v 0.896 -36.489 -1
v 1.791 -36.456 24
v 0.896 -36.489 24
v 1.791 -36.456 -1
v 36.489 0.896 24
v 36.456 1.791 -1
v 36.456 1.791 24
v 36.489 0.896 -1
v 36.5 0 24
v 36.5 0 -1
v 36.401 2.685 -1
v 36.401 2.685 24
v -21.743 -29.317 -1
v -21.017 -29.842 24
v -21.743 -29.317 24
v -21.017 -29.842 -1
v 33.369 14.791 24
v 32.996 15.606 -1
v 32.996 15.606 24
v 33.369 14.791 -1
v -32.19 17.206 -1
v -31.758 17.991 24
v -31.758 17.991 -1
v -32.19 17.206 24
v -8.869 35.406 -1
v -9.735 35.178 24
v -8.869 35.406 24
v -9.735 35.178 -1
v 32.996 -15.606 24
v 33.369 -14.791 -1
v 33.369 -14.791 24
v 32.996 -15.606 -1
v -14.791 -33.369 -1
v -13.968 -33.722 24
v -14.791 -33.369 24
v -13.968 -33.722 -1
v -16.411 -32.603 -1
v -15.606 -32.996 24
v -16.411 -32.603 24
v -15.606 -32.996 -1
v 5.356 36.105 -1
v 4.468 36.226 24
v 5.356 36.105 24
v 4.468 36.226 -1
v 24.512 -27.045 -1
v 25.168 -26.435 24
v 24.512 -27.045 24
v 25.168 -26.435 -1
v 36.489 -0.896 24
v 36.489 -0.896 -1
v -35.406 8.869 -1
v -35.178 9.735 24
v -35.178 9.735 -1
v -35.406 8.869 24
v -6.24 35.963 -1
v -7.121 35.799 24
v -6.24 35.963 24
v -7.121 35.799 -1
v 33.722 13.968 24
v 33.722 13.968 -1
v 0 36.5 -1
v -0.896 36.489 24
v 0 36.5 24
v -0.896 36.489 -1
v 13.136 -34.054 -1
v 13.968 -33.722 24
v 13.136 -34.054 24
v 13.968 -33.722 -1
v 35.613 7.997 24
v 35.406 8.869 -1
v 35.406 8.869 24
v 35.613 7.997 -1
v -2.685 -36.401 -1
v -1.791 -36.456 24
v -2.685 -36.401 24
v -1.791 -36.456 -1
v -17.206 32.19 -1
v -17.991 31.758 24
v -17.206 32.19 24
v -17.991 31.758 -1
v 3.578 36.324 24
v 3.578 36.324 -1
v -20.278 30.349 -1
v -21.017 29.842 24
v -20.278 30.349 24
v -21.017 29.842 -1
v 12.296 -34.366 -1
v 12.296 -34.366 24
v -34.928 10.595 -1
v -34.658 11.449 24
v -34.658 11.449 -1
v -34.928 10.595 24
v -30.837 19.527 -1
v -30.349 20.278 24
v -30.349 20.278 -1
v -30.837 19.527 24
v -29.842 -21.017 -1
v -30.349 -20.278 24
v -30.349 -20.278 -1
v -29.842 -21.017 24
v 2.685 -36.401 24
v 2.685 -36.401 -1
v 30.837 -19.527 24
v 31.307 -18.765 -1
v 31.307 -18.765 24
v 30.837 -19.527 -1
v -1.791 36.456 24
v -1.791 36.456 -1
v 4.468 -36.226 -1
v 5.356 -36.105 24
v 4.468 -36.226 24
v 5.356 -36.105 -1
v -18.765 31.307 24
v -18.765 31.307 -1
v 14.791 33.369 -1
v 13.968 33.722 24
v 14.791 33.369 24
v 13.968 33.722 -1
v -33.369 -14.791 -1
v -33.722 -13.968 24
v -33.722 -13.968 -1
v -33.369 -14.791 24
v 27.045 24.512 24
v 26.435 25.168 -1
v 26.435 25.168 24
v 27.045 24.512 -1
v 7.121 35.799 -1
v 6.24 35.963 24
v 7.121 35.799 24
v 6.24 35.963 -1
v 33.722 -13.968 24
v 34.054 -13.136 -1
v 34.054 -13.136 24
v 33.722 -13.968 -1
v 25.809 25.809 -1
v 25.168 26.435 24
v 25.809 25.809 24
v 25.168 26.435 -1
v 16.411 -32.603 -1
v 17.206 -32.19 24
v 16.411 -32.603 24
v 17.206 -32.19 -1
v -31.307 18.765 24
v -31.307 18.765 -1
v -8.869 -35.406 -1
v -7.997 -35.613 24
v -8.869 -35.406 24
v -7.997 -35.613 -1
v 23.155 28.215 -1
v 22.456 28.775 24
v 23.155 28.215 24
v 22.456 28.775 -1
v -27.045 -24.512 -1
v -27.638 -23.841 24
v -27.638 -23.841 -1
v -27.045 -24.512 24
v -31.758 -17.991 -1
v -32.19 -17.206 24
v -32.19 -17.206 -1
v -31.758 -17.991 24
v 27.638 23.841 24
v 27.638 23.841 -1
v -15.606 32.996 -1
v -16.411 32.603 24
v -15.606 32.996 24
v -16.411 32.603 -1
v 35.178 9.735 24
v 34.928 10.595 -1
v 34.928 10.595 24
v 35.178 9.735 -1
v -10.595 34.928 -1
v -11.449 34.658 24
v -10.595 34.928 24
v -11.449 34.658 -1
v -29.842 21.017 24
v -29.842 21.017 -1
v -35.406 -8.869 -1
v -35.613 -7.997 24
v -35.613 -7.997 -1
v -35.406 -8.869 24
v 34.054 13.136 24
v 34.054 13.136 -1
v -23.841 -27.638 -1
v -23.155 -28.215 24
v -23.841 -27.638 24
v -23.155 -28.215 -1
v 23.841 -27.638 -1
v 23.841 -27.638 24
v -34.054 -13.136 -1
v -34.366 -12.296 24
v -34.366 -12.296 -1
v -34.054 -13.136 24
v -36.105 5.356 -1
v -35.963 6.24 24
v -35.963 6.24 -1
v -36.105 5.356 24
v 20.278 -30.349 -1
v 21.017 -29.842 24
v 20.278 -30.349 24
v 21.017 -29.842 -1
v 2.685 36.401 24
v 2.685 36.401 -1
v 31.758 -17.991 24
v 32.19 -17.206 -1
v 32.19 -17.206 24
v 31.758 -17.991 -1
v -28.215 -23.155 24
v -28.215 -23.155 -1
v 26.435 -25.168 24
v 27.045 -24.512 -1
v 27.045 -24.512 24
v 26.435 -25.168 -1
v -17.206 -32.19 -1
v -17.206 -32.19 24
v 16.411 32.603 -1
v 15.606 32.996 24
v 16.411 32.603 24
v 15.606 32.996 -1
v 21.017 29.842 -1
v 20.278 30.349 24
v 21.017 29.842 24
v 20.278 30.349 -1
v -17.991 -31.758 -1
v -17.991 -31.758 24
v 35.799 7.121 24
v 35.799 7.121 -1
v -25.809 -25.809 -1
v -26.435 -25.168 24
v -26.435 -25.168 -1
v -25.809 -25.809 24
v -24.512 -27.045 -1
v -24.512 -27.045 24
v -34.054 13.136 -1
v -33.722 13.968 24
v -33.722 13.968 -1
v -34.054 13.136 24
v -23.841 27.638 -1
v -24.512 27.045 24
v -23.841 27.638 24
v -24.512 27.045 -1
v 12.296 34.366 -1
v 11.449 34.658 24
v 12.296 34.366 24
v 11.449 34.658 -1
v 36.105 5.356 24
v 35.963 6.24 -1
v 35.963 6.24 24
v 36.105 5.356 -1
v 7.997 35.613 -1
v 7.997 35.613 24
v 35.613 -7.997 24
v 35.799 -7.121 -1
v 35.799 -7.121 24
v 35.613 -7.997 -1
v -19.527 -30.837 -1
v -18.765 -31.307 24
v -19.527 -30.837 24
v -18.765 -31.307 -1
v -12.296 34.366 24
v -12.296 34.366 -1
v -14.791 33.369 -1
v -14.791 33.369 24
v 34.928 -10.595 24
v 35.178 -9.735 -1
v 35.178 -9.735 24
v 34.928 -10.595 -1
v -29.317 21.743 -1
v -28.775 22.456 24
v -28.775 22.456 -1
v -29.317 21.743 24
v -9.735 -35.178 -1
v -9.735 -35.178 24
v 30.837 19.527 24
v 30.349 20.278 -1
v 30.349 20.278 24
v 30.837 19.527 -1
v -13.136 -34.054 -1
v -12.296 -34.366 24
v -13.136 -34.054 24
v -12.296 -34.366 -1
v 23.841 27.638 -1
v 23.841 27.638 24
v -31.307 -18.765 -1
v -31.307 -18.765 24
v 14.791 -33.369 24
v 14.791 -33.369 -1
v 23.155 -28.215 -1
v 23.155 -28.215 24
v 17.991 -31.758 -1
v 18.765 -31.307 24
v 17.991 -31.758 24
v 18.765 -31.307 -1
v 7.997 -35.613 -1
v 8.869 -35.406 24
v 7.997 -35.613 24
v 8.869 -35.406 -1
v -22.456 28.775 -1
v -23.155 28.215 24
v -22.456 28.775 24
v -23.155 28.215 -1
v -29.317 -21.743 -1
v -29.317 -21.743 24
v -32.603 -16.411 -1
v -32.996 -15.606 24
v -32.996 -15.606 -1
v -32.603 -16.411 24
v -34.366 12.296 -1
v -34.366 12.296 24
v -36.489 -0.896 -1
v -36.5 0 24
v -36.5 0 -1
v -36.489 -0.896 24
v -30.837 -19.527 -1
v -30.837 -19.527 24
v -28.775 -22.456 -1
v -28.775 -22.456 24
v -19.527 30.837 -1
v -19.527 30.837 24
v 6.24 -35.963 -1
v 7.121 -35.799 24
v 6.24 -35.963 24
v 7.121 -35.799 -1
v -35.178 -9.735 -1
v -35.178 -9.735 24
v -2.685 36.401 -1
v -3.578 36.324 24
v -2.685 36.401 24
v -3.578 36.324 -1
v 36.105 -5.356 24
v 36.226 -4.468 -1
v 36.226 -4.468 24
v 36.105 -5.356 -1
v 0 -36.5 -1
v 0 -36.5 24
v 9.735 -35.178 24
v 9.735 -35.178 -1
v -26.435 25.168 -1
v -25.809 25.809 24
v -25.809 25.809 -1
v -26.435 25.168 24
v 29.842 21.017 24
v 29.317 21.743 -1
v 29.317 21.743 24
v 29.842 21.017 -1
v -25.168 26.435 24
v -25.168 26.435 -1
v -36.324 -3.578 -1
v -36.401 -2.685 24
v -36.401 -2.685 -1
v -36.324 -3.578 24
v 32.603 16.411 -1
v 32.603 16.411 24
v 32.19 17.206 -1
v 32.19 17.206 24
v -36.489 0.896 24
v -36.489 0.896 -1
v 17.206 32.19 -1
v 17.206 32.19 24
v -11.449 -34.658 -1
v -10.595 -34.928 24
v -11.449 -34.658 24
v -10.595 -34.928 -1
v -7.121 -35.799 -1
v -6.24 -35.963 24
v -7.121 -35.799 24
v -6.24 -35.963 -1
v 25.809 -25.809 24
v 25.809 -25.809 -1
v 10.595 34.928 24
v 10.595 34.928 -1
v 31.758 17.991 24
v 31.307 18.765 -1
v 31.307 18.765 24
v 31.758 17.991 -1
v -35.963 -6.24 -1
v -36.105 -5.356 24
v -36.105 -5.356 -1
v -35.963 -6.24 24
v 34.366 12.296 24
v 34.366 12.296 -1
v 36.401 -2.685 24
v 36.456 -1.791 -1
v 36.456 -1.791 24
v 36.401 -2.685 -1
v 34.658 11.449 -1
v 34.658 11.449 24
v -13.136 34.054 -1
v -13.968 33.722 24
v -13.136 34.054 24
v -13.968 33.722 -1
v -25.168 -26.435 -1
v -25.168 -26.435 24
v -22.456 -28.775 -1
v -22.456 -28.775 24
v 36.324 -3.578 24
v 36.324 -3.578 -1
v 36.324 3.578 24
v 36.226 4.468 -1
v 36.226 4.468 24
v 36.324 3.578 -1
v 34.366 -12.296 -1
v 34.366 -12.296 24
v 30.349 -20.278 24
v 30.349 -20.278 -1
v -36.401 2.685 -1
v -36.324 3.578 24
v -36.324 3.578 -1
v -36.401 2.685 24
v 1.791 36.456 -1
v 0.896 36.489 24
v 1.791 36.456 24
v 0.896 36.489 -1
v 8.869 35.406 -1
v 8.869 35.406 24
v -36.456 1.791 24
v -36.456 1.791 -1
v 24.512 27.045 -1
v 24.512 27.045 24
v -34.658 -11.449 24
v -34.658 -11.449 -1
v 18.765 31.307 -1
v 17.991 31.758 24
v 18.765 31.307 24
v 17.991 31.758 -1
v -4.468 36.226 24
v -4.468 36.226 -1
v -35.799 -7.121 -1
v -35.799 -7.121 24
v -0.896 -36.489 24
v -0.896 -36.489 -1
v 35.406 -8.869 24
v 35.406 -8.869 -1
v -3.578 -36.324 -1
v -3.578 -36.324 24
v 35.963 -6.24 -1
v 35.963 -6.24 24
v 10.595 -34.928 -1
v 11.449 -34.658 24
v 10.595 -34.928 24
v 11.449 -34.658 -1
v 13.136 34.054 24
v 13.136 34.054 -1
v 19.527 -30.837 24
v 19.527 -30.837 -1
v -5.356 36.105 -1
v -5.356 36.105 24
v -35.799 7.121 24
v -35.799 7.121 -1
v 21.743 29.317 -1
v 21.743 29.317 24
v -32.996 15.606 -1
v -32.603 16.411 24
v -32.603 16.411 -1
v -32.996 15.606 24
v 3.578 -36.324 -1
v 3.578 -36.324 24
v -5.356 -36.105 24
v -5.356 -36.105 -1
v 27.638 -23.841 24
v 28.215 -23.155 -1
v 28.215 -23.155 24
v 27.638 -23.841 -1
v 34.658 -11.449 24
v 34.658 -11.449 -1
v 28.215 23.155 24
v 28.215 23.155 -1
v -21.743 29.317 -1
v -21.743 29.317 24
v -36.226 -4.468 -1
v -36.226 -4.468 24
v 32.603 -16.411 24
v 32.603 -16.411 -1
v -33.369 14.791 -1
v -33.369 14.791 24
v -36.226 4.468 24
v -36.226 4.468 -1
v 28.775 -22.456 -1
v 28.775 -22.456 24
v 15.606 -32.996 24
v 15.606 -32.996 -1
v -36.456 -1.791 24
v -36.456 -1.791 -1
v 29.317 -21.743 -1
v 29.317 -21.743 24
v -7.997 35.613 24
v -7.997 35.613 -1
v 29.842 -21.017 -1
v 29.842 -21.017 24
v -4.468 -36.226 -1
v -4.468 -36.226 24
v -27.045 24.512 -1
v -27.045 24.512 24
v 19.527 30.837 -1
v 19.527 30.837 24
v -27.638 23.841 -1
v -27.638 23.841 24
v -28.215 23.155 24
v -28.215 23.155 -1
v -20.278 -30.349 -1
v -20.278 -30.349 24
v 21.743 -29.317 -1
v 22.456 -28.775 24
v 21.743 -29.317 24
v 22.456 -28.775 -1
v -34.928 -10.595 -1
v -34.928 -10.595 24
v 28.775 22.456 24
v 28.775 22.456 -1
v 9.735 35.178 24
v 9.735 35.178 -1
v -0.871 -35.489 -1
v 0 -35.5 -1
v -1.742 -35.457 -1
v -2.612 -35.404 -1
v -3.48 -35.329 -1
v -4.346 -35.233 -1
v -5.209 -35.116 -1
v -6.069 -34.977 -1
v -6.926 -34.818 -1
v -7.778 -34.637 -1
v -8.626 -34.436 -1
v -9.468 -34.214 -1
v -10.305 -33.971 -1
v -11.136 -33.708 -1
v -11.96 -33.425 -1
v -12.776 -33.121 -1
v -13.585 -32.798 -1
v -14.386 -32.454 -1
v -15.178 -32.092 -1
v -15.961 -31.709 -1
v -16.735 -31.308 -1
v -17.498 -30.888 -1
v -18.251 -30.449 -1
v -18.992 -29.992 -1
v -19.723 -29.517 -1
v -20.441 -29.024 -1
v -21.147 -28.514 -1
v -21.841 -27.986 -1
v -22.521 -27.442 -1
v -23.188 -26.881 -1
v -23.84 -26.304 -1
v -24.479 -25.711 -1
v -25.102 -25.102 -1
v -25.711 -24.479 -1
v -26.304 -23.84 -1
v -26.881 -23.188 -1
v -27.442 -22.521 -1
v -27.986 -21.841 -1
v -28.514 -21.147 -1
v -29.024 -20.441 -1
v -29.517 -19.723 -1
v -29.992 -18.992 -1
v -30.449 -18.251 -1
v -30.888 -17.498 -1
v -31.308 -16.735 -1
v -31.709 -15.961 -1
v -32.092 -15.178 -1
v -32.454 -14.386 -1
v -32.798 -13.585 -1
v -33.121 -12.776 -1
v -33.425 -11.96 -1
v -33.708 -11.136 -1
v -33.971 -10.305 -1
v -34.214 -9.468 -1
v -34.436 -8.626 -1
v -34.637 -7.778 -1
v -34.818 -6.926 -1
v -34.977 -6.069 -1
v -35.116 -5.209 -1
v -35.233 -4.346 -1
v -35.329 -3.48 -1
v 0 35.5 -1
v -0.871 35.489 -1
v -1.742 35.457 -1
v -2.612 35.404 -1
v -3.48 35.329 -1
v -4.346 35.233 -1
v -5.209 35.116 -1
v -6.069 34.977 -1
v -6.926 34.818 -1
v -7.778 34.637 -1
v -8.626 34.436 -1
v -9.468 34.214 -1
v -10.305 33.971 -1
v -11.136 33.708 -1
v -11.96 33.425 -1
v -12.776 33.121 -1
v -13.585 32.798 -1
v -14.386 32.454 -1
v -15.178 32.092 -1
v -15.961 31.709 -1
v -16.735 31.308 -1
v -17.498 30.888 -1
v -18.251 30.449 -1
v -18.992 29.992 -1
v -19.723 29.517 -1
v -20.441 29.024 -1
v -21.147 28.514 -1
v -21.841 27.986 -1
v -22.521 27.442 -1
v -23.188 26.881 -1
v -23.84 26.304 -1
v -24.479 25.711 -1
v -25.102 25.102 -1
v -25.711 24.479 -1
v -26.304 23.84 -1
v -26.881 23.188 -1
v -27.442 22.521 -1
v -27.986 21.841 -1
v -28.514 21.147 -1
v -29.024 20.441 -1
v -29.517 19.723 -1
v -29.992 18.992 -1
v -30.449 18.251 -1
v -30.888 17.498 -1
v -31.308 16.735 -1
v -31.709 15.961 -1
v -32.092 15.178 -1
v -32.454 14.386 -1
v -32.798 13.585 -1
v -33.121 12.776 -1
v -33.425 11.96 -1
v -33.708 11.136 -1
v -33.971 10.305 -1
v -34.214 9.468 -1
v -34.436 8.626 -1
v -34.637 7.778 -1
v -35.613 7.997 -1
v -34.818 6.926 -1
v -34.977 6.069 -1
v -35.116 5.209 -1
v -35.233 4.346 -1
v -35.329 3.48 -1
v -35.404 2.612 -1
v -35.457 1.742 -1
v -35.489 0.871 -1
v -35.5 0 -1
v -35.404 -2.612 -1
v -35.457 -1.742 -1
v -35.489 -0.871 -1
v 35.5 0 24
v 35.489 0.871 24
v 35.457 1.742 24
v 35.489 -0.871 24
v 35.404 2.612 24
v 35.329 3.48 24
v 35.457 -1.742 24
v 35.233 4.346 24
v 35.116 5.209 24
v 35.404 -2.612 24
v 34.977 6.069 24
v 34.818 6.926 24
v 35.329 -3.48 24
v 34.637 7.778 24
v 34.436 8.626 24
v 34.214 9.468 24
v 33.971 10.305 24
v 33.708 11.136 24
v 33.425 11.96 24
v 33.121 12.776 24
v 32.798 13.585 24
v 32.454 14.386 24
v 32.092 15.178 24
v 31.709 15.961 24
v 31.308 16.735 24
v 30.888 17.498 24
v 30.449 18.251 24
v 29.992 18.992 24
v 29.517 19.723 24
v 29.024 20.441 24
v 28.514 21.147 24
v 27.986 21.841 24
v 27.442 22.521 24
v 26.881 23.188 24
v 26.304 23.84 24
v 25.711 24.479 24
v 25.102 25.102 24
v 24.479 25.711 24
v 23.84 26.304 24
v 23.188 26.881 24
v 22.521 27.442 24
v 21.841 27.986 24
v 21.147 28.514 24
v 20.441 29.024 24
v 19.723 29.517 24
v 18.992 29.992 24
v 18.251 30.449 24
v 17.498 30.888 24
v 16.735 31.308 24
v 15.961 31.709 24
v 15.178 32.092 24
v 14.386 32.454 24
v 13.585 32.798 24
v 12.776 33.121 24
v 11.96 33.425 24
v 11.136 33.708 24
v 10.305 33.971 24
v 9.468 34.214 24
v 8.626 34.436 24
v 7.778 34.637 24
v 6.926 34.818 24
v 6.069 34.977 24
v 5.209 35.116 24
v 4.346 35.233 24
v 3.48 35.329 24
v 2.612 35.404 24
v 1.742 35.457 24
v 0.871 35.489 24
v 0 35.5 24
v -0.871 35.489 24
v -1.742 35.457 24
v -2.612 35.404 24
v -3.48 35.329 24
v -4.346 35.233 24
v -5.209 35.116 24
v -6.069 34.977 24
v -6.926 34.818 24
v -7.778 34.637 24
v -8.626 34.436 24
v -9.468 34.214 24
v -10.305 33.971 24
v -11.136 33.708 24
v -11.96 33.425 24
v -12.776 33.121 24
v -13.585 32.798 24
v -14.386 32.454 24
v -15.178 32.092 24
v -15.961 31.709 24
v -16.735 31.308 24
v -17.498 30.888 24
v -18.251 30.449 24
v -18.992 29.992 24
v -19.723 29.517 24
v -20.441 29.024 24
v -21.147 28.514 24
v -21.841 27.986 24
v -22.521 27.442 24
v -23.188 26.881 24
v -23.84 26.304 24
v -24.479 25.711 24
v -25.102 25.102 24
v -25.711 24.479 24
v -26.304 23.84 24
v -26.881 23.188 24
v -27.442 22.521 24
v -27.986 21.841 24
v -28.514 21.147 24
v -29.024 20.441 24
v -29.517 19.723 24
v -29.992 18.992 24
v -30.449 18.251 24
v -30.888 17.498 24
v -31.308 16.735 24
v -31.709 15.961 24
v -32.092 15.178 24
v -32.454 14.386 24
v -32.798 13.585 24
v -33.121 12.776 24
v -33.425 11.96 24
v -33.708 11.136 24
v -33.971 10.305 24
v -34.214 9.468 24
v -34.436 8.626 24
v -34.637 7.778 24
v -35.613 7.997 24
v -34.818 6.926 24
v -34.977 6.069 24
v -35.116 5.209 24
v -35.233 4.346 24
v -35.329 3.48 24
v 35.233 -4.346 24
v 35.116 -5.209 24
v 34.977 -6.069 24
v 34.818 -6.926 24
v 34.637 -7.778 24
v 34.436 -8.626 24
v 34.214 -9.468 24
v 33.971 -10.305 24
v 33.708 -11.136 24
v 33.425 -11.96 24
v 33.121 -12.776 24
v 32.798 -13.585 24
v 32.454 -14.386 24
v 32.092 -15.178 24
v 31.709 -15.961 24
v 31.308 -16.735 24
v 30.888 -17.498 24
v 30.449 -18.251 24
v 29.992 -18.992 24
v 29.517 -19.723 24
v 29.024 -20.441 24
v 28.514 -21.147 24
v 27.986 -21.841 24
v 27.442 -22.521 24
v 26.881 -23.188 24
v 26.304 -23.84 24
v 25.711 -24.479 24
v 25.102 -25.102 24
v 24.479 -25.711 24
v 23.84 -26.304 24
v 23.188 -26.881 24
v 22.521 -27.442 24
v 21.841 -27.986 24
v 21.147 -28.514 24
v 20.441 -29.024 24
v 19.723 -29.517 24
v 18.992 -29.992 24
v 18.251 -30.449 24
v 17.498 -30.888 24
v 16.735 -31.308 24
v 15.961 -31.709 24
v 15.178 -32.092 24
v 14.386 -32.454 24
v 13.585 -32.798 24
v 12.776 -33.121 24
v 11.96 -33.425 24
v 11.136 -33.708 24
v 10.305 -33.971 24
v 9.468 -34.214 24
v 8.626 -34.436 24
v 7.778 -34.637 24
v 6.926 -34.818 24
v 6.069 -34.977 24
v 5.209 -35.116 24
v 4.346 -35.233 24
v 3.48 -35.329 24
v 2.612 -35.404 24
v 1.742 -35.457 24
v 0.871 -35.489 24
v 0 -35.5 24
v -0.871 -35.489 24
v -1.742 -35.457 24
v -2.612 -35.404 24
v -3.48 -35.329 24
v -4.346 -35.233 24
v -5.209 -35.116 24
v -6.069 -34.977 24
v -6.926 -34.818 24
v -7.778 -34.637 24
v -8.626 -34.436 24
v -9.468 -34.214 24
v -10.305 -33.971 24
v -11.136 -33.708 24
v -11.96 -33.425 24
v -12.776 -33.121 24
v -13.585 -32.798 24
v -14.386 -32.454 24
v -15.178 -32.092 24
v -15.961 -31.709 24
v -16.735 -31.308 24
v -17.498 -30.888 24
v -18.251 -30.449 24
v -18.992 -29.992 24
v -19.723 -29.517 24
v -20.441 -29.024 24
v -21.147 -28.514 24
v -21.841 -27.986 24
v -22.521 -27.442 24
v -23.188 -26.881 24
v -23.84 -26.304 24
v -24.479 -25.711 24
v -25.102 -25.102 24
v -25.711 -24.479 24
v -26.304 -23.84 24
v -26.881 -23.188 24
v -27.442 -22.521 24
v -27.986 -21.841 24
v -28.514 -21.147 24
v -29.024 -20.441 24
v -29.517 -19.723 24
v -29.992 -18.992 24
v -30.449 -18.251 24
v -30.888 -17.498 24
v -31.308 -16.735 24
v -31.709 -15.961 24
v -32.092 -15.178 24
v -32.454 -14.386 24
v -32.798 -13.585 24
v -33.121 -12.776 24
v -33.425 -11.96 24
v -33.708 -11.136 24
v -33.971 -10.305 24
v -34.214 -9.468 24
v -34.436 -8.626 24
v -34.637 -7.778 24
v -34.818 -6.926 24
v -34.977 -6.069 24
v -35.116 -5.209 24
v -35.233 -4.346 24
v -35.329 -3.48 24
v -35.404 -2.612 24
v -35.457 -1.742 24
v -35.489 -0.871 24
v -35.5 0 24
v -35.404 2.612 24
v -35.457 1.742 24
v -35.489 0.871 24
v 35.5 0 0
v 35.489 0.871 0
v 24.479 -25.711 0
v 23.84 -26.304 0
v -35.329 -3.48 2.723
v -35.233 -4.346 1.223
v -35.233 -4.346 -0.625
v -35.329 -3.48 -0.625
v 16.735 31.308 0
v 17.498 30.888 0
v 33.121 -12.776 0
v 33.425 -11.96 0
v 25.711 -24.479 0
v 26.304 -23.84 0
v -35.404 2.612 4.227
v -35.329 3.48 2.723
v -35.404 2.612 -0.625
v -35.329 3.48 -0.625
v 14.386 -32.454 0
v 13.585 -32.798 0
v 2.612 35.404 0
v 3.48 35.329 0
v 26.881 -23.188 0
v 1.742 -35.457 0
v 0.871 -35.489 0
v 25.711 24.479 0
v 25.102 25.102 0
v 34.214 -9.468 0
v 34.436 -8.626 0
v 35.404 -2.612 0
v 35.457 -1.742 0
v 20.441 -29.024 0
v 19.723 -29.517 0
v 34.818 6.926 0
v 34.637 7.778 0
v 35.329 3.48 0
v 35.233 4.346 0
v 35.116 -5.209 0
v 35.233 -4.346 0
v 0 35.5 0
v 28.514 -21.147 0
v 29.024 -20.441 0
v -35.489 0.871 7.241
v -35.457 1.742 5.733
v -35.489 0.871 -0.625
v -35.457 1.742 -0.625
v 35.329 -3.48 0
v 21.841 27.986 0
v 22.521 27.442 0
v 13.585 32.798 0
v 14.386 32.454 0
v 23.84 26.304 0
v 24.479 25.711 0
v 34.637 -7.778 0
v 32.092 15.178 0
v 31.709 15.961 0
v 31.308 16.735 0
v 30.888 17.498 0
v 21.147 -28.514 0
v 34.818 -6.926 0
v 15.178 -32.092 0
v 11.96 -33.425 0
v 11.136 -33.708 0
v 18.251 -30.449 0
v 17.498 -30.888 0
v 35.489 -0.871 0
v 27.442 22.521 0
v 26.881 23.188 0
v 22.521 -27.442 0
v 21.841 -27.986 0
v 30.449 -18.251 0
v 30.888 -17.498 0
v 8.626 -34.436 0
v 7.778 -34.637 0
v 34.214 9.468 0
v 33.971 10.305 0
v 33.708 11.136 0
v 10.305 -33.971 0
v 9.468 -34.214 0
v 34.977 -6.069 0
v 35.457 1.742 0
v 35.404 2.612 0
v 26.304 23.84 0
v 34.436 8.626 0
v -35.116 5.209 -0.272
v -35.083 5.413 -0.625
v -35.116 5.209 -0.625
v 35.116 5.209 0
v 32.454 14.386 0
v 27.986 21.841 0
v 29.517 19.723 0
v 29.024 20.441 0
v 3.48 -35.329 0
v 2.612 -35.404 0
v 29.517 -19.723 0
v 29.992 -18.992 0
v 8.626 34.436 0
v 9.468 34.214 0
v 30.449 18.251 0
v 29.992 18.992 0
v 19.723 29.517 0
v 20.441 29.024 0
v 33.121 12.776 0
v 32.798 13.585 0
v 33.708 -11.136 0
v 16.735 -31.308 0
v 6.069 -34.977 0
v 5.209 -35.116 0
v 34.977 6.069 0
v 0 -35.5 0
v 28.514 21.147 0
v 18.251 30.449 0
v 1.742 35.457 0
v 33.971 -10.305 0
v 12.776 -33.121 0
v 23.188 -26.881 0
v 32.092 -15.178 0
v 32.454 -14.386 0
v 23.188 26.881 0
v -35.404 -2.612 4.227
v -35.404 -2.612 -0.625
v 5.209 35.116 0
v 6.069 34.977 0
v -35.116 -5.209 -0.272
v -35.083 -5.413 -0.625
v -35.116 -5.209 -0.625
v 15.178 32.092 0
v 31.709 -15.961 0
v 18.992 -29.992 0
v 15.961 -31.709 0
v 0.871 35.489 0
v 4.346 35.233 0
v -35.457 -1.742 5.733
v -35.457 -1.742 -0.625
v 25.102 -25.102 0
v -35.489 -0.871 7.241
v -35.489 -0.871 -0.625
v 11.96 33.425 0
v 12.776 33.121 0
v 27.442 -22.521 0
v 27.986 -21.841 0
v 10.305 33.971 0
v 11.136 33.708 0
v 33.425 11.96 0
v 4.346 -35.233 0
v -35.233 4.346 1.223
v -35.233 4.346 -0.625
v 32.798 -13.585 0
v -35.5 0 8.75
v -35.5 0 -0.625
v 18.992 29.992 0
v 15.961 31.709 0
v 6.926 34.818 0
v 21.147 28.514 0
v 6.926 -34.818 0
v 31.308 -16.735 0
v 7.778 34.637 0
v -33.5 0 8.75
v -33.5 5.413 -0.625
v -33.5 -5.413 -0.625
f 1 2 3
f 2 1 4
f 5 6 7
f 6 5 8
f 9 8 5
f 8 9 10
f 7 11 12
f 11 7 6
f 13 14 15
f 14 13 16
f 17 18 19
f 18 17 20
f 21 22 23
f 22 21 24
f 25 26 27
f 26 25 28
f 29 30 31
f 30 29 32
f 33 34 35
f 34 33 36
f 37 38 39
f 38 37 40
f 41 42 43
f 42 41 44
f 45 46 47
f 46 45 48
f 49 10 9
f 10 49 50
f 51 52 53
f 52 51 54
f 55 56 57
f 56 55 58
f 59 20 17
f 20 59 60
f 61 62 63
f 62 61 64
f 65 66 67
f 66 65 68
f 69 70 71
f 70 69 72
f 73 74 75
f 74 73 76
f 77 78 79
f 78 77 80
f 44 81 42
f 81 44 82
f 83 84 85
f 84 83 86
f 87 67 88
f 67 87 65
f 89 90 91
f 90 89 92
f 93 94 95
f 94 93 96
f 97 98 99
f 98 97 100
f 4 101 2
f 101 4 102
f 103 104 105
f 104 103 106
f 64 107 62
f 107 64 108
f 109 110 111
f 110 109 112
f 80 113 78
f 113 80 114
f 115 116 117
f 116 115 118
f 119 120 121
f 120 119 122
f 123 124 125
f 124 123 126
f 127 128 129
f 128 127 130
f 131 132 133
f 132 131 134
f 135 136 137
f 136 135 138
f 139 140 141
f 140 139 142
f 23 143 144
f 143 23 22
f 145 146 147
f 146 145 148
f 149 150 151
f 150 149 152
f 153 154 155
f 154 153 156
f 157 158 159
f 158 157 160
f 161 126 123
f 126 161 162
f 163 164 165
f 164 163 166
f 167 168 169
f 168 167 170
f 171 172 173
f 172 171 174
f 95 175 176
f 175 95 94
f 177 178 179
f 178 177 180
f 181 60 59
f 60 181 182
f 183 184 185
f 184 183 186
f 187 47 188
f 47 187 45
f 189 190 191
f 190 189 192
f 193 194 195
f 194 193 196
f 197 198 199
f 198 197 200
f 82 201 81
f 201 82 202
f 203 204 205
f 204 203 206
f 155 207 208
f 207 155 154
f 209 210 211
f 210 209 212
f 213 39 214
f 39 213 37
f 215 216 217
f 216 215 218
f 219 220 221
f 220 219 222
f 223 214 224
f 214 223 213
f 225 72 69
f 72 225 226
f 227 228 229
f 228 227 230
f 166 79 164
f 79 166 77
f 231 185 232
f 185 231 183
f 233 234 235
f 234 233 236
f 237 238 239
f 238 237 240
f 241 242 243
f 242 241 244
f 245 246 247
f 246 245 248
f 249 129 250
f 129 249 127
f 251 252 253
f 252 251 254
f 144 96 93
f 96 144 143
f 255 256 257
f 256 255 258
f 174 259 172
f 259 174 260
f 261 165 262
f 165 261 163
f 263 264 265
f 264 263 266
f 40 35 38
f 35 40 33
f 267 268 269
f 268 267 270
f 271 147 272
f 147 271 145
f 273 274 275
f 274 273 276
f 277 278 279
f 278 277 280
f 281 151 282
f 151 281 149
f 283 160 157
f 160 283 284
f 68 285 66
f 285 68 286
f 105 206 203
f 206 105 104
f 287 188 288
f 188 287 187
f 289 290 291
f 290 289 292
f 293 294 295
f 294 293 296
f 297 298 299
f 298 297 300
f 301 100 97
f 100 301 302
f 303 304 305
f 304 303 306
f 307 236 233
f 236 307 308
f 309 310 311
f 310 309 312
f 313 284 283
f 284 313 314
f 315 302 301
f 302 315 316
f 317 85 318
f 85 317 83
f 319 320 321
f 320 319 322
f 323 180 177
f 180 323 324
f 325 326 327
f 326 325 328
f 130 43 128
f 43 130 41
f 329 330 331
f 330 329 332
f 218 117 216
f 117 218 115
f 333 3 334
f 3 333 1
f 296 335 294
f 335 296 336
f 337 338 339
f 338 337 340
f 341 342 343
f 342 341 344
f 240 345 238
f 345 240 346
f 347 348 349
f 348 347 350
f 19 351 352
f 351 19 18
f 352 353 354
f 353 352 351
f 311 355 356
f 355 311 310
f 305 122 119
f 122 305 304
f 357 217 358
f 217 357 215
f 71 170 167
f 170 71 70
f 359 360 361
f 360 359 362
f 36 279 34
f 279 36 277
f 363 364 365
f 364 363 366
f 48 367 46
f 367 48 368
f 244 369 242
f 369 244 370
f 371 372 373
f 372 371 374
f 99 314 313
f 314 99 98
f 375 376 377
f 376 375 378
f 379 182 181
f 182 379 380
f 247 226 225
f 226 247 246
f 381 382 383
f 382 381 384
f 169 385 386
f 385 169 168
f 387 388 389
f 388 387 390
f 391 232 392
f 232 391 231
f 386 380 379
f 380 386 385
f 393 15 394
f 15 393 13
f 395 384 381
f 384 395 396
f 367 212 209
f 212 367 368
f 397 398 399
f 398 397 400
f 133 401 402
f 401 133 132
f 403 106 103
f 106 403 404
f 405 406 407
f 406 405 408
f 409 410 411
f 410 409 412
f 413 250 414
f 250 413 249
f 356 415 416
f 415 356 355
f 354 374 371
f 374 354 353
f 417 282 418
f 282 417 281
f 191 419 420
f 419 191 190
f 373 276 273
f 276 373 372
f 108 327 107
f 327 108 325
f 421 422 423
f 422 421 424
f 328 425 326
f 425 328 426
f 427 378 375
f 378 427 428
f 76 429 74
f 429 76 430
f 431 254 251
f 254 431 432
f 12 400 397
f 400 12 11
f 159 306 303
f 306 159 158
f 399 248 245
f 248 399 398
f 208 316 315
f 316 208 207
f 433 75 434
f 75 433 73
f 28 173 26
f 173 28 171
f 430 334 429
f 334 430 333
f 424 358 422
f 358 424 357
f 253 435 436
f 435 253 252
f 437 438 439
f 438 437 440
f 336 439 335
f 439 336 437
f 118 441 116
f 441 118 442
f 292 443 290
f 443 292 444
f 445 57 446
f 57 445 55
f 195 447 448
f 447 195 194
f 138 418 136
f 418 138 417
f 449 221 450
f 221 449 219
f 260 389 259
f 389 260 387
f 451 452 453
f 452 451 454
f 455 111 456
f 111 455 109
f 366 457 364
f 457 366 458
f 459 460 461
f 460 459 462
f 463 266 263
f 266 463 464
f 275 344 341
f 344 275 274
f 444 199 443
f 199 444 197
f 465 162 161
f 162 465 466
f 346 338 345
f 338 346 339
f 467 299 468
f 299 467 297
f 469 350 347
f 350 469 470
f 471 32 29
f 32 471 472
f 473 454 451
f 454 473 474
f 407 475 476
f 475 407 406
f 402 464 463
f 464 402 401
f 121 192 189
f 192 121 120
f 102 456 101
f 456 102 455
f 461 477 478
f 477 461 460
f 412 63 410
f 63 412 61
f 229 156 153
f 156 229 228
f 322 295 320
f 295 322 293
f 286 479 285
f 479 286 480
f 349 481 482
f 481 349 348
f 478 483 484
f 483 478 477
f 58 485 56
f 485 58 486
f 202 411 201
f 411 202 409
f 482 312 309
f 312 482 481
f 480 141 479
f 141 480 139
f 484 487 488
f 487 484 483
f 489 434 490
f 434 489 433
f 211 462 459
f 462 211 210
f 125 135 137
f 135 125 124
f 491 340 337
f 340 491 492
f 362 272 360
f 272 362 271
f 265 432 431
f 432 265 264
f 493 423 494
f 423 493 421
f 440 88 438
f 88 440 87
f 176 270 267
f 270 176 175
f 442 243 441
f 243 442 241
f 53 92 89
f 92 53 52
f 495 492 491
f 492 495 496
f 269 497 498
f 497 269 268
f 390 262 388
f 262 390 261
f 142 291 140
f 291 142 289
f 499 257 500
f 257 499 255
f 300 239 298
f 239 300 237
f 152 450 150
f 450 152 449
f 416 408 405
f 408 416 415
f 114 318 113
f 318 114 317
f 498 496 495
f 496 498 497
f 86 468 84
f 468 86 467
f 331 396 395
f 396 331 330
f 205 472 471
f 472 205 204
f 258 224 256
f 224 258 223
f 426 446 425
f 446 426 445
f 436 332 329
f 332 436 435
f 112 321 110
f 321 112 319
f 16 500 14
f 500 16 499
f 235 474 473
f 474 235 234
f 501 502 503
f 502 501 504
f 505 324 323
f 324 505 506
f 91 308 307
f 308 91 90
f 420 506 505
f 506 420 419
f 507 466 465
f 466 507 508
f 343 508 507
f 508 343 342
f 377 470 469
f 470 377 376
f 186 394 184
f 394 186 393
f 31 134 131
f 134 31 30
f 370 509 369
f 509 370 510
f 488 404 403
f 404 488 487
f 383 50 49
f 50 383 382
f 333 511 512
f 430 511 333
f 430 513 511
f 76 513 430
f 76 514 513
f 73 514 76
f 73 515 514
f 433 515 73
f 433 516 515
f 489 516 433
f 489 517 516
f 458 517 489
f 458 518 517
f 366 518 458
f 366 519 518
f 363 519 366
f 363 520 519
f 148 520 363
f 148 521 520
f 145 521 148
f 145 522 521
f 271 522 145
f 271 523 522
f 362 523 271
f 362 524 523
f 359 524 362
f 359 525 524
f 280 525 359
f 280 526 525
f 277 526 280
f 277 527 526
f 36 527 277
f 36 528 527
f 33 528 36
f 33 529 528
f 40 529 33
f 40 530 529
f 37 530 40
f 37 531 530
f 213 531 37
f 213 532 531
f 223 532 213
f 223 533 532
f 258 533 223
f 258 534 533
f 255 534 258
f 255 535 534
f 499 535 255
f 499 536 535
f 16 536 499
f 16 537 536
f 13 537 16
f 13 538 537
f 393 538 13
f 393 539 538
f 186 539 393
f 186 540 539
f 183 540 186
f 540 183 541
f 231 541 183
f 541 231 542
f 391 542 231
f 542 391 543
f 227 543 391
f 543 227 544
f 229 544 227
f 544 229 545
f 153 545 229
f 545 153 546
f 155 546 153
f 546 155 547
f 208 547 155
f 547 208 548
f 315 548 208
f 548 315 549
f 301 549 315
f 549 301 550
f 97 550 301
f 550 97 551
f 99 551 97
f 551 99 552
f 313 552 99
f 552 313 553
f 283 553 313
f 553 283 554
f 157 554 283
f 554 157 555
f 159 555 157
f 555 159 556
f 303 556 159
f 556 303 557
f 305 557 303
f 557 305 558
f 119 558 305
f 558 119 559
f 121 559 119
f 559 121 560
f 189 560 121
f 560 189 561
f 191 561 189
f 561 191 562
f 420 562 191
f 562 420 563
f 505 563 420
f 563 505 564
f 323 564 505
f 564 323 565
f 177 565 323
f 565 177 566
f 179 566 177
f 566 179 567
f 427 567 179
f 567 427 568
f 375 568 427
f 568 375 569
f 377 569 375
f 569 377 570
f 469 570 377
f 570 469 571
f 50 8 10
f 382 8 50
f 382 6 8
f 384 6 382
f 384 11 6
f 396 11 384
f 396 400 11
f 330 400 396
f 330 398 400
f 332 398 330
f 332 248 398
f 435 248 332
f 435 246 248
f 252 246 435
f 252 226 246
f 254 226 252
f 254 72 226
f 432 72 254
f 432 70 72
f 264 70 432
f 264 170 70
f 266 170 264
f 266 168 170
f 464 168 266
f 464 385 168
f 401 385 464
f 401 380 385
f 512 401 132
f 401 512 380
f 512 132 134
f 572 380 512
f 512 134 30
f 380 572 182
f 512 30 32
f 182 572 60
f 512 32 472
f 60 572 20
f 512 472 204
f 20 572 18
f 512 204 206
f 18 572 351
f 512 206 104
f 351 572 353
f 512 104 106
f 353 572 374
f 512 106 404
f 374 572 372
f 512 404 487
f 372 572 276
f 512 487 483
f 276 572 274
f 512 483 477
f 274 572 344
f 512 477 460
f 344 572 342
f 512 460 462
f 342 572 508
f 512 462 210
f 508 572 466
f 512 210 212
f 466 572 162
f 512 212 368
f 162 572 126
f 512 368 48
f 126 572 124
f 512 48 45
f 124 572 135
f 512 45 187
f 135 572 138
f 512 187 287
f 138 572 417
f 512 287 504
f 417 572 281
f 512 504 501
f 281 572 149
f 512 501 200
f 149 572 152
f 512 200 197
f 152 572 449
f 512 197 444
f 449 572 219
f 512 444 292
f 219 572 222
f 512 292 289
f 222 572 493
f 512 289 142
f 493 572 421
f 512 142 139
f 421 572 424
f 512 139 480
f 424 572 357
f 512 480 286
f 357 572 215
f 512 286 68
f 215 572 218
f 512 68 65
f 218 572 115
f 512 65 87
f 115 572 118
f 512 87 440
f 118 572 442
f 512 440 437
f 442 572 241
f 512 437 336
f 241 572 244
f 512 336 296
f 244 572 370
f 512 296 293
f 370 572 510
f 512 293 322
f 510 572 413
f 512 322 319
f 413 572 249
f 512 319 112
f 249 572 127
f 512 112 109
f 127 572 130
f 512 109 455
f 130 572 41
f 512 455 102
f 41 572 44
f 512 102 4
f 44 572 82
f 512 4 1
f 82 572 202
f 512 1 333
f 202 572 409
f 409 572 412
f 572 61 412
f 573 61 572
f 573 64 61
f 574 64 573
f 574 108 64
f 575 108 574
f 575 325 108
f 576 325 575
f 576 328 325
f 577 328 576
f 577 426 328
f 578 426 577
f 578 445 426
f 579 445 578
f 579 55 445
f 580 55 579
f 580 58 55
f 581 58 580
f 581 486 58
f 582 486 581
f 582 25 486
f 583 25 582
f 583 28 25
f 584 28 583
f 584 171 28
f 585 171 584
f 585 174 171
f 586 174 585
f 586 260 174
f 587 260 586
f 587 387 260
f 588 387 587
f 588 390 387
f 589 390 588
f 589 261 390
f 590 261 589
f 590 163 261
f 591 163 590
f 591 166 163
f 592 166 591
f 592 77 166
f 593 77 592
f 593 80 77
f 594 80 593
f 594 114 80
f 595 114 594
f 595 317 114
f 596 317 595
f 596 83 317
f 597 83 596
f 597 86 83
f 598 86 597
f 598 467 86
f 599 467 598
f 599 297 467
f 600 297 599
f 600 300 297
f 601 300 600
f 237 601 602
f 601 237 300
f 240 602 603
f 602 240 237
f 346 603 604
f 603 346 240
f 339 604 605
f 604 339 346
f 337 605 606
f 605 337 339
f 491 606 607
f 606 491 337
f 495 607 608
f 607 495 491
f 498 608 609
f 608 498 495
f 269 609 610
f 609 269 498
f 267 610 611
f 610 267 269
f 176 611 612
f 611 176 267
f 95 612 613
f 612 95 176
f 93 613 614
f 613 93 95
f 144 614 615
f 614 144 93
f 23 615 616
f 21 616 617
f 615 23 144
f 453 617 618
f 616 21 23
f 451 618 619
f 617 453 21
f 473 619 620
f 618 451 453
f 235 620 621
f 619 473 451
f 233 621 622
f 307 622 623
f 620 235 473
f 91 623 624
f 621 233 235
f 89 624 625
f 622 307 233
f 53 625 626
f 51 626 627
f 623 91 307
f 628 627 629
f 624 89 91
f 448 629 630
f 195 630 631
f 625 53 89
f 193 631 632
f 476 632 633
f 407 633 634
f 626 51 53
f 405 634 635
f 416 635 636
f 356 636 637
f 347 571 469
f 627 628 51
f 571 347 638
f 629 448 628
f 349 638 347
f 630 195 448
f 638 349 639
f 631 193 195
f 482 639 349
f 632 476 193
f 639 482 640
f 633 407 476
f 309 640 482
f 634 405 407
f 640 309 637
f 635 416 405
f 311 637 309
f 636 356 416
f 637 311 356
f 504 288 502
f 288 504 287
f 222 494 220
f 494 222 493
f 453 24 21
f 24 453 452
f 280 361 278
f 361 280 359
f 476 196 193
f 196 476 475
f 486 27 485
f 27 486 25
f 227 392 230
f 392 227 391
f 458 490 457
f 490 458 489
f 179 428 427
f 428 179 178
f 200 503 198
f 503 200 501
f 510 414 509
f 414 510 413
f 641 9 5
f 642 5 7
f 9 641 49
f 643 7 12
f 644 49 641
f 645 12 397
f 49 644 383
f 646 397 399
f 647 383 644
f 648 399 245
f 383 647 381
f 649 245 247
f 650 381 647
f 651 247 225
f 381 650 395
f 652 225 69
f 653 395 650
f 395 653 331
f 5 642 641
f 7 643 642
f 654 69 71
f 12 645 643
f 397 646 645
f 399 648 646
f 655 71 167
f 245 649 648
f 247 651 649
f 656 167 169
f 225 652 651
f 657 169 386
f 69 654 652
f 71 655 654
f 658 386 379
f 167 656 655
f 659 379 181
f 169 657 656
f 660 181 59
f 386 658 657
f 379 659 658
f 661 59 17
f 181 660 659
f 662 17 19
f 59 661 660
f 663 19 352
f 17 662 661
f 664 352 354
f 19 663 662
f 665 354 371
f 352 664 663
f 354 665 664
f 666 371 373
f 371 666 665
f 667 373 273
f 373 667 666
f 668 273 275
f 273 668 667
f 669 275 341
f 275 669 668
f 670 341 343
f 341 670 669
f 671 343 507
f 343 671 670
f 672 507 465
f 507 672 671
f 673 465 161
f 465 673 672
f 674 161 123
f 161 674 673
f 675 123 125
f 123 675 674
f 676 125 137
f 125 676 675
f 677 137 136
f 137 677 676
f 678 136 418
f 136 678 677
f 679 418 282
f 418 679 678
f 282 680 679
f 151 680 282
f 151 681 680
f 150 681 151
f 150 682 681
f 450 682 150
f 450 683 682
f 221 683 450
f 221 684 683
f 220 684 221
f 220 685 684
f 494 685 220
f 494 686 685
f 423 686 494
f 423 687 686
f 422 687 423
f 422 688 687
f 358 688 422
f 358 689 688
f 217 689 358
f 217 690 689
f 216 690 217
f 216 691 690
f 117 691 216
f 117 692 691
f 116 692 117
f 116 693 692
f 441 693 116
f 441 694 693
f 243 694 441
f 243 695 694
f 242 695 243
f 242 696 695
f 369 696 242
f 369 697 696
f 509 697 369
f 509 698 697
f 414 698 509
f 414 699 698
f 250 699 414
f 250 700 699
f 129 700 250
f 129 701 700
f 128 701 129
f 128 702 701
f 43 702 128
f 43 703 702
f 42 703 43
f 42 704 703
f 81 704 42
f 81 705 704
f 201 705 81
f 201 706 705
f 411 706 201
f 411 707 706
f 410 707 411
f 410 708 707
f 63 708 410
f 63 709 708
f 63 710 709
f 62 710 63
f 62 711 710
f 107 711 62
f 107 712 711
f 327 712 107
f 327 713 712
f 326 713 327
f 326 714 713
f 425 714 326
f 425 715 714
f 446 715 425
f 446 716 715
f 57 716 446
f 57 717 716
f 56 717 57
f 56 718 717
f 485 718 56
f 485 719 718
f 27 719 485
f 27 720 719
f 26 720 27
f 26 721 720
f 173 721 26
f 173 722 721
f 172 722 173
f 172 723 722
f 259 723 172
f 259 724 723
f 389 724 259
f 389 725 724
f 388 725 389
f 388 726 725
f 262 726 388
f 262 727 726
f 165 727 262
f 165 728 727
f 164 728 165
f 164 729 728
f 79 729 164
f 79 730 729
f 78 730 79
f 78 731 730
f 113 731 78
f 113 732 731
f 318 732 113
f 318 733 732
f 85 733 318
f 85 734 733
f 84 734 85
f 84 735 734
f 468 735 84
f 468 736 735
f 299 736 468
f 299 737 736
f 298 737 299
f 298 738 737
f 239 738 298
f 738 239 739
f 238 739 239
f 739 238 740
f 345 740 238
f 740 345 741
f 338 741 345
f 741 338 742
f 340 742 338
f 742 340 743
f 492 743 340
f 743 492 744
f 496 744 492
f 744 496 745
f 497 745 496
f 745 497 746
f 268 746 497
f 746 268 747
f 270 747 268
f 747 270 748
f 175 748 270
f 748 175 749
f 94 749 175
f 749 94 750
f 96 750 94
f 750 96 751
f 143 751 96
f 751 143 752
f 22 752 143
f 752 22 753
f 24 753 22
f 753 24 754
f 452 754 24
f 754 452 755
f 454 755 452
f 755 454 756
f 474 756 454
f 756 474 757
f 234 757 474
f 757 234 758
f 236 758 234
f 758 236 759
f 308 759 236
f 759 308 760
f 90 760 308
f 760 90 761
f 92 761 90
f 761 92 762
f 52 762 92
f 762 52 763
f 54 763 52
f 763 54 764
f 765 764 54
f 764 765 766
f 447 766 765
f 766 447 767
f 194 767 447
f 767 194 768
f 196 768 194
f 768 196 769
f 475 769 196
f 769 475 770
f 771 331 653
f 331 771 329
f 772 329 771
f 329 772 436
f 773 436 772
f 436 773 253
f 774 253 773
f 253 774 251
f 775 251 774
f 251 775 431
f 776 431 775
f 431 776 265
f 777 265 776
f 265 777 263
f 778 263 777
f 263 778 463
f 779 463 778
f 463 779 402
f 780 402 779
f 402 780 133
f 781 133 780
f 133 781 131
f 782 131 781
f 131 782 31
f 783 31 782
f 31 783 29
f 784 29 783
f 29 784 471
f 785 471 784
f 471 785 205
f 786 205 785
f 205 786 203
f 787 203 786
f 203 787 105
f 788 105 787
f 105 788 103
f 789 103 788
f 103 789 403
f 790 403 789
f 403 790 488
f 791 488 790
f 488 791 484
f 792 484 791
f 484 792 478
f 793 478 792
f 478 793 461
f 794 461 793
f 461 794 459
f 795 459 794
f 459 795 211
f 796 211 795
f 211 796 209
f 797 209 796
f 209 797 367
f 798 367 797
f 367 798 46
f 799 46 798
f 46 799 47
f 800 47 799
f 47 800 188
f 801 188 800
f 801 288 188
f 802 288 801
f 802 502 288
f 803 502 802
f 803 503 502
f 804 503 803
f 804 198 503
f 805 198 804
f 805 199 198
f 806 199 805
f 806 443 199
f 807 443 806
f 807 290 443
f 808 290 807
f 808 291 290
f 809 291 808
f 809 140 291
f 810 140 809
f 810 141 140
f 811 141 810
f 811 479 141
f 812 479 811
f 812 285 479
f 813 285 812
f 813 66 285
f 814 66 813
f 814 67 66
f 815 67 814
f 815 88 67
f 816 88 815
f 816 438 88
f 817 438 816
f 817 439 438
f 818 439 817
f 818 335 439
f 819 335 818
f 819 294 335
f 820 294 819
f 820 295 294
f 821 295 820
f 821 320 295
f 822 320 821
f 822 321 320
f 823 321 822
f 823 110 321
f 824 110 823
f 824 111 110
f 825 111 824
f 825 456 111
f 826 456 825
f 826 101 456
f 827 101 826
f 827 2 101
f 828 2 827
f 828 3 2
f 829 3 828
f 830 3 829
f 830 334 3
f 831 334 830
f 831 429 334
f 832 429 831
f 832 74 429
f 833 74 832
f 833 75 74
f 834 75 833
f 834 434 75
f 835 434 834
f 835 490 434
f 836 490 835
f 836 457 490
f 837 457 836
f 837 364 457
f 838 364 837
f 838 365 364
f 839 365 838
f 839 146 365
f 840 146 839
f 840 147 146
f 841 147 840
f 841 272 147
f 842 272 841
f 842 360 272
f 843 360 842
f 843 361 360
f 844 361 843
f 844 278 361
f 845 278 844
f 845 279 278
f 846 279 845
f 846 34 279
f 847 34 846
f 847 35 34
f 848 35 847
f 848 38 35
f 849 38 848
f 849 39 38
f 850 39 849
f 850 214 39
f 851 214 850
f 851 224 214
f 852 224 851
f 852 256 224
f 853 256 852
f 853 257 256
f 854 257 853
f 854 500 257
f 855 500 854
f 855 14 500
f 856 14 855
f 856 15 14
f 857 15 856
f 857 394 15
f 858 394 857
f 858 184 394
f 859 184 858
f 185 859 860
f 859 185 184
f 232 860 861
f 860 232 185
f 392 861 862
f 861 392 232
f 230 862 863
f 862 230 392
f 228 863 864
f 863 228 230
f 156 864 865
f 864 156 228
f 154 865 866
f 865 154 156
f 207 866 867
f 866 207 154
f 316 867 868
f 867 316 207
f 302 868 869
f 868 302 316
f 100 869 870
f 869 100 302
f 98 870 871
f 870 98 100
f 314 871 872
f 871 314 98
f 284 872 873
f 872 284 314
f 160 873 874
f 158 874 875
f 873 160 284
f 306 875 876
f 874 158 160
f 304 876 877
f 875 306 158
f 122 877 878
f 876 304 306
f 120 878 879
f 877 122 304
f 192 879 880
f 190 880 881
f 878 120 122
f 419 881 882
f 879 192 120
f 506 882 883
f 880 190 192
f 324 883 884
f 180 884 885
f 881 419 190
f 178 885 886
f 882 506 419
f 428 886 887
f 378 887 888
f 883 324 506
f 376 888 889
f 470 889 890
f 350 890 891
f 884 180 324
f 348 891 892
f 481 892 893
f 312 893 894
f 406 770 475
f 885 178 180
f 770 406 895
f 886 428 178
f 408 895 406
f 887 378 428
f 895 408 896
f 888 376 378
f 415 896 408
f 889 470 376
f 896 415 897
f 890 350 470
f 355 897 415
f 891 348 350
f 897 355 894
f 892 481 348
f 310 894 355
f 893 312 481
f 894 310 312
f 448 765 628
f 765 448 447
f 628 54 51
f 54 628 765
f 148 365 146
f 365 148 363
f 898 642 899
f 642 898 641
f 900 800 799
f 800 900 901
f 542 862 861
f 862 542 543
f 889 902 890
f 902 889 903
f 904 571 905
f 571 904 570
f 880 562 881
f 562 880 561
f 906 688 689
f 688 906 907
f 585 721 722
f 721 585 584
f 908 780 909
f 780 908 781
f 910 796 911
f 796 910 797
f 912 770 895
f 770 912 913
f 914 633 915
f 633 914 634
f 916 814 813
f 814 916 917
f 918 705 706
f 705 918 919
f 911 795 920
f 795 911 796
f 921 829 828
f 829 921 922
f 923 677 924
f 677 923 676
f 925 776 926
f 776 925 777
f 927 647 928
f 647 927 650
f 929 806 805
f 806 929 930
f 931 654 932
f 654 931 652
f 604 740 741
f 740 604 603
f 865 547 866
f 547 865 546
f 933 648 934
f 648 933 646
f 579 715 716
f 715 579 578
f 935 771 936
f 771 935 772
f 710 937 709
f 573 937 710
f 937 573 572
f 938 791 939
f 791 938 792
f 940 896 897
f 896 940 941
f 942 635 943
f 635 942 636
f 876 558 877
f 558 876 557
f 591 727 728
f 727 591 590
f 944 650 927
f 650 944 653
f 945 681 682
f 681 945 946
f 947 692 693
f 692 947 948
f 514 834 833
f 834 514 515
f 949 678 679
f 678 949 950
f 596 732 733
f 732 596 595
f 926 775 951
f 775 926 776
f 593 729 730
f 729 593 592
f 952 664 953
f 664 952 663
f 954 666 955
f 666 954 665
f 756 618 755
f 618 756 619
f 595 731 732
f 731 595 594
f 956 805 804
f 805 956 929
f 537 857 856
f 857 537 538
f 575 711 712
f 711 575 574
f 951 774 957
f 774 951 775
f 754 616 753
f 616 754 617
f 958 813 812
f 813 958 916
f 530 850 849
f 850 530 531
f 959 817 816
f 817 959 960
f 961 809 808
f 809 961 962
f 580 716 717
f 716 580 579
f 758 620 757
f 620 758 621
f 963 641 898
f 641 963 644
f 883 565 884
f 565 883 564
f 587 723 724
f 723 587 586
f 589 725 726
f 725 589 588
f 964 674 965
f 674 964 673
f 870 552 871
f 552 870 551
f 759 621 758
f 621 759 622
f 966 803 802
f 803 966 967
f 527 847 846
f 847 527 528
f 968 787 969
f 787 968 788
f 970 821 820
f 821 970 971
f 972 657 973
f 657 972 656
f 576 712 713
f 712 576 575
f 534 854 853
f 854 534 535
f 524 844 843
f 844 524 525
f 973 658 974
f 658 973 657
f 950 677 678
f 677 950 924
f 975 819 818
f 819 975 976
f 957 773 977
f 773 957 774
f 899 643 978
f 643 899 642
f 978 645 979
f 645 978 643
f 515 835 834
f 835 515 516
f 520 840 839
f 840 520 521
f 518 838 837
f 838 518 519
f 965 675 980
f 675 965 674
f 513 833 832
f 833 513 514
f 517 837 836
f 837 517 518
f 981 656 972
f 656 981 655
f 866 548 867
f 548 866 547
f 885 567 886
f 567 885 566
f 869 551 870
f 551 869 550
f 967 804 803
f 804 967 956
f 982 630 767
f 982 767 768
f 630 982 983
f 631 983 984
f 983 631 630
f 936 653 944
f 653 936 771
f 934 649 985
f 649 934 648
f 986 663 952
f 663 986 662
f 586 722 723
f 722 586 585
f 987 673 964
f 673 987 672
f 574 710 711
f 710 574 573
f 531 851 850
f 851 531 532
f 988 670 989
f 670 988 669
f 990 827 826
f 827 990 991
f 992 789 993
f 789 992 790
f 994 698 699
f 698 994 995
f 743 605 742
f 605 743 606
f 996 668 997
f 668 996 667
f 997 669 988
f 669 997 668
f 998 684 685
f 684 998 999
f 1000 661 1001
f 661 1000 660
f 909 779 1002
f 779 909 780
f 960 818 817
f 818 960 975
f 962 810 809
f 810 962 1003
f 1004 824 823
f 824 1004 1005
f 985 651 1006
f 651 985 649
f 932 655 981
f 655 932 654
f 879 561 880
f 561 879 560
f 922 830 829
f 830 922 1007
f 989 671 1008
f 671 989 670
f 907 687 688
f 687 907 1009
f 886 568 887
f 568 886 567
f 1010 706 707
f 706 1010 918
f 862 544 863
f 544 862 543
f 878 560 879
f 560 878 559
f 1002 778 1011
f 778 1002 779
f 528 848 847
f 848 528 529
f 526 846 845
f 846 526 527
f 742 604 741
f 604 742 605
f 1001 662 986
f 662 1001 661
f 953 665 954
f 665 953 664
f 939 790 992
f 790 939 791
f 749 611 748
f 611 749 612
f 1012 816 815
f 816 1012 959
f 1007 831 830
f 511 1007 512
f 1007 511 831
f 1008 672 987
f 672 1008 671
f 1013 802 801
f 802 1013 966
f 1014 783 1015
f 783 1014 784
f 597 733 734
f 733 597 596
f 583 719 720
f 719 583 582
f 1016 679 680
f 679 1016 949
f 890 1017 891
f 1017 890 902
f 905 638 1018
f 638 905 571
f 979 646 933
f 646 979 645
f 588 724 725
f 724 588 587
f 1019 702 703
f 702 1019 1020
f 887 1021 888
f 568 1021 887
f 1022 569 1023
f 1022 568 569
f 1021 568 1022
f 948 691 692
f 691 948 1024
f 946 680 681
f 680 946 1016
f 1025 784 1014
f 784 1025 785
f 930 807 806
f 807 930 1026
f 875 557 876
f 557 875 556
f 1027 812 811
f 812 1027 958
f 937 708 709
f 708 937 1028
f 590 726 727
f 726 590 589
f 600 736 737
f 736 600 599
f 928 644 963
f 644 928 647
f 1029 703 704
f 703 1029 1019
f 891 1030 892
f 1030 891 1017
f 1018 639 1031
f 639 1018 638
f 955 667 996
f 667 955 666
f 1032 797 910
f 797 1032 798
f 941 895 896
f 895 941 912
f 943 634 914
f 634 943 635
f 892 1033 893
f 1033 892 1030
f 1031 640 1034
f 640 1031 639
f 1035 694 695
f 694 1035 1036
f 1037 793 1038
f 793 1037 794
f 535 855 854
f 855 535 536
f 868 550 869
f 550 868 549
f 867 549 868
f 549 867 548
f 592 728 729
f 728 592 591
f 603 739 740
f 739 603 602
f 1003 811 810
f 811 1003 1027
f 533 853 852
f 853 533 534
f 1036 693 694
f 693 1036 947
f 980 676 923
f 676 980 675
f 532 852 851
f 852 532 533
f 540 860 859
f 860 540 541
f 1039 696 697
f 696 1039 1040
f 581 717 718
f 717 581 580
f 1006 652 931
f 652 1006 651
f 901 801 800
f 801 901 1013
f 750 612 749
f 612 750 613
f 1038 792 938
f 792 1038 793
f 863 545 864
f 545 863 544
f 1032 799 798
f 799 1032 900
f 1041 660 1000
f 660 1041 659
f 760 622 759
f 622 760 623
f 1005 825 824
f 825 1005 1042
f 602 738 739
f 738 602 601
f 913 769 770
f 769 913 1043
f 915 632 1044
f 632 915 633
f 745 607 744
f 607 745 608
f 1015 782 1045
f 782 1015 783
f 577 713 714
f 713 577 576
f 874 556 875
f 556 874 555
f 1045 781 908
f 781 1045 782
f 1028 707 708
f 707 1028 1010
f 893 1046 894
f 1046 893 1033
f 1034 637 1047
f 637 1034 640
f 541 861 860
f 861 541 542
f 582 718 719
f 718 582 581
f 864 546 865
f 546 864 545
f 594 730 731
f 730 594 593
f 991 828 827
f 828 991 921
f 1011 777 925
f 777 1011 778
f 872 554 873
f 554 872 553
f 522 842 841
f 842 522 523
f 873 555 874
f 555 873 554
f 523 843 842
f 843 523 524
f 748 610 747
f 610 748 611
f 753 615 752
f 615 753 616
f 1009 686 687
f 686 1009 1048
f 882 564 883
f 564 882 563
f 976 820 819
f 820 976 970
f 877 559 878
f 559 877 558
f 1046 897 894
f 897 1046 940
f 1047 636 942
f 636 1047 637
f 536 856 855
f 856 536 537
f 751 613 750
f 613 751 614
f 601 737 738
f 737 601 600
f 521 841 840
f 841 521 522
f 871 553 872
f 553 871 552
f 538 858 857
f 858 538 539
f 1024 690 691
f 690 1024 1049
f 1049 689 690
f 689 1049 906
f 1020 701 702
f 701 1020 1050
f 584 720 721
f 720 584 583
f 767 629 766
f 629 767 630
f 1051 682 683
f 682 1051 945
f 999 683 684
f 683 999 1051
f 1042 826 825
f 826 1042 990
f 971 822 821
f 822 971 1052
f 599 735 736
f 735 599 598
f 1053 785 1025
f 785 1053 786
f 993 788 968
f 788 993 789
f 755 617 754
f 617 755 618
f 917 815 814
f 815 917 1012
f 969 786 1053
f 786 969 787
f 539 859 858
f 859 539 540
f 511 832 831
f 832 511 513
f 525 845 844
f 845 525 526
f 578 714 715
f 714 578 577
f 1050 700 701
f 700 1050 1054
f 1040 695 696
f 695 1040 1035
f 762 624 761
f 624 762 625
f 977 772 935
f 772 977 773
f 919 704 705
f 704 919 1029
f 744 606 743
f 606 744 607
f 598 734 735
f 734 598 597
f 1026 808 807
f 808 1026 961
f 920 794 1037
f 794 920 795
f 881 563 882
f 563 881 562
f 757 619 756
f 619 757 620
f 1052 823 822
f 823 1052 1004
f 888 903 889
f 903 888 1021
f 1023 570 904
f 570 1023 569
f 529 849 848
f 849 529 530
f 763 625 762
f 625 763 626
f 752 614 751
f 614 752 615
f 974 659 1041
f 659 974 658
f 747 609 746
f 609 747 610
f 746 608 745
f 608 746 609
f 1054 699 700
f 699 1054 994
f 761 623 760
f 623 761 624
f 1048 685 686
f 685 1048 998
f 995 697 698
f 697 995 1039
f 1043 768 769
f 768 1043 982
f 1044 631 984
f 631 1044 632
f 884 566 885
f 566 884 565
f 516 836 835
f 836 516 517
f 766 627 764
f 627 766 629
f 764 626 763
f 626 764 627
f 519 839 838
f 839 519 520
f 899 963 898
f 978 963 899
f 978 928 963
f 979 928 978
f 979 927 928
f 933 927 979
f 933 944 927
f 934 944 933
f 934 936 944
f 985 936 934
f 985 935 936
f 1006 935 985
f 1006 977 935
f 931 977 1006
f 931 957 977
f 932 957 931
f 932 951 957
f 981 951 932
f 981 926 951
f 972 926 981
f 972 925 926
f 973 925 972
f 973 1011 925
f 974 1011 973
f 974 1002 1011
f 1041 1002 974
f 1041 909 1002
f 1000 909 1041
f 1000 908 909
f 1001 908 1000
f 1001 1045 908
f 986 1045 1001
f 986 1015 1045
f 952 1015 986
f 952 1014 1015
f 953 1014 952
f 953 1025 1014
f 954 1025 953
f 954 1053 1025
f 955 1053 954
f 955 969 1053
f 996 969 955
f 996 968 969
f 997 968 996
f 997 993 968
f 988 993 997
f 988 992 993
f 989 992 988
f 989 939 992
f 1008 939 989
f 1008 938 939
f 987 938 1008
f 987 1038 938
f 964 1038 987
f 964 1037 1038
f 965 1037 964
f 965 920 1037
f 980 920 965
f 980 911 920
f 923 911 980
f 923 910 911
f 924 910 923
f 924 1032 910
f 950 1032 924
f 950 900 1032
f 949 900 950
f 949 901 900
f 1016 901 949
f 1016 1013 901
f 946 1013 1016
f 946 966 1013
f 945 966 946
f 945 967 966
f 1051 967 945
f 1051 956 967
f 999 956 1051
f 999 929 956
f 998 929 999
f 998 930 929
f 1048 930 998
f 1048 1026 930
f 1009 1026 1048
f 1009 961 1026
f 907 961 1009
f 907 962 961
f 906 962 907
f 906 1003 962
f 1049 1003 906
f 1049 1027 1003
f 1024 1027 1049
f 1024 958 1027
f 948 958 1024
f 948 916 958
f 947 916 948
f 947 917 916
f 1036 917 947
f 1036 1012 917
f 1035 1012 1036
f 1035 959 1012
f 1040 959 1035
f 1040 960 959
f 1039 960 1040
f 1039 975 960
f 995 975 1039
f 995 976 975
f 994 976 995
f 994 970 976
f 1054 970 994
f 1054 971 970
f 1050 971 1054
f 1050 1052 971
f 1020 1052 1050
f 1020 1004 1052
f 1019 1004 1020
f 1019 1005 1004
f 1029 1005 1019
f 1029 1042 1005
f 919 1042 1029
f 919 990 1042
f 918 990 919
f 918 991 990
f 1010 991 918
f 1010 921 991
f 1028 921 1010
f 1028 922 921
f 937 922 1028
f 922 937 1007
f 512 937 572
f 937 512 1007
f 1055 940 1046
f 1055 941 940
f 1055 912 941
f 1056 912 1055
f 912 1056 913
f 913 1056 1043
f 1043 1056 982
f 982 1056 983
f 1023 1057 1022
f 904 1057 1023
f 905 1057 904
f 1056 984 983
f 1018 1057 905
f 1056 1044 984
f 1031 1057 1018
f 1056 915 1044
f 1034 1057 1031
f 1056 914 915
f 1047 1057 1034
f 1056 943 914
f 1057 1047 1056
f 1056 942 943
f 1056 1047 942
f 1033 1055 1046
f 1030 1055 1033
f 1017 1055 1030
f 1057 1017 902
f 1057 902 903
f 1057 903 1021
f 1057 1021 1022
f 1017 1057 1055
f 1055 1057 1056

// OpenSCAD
// This project is to create a candy despenser, specifically skittles, that connects to home assistant.

mason_jar_inner_diameter = 60;
mason_jar_outer_diameter = 71;
skittle_diameter = 13;
skittle_height = 9;
motor_shaft_diameter = 5;
motor_shaft_height = 6.5;
motor_shaft_key_width = 3;

$fn = 256;

cuff_height = 25;
wall_thickness = 1;
cuff_diameter = mason_jar_outer_diameter+wall_thickness*2;

// First the cuff
translate([0,0,-wall_thickness]) {
    
    difference() {
        cylinder(cuff_height,d=cuff_diameter);
        translate([0,0,-1])
            cylinder(cuff_height+2,d=cuff_diameter-wall_thickness*2);
        }
    
    // Cuff needs a base
    intersection() {
        cylinder(wall_thickness,d=cuff_diameter-1);
        translate([0,-cuff_diameter,0])
            cube([cuff_diameter*2,cuff_diameter*2,wall_thickness]);
        }
    
    // the key for the shield
    translate([-cuff_diameter/2+3,0,cuff_height/2-10+1])
        rotate([0,-90,0])
            cylinder(2,d=cuff_height/2,$fn=3);
}
